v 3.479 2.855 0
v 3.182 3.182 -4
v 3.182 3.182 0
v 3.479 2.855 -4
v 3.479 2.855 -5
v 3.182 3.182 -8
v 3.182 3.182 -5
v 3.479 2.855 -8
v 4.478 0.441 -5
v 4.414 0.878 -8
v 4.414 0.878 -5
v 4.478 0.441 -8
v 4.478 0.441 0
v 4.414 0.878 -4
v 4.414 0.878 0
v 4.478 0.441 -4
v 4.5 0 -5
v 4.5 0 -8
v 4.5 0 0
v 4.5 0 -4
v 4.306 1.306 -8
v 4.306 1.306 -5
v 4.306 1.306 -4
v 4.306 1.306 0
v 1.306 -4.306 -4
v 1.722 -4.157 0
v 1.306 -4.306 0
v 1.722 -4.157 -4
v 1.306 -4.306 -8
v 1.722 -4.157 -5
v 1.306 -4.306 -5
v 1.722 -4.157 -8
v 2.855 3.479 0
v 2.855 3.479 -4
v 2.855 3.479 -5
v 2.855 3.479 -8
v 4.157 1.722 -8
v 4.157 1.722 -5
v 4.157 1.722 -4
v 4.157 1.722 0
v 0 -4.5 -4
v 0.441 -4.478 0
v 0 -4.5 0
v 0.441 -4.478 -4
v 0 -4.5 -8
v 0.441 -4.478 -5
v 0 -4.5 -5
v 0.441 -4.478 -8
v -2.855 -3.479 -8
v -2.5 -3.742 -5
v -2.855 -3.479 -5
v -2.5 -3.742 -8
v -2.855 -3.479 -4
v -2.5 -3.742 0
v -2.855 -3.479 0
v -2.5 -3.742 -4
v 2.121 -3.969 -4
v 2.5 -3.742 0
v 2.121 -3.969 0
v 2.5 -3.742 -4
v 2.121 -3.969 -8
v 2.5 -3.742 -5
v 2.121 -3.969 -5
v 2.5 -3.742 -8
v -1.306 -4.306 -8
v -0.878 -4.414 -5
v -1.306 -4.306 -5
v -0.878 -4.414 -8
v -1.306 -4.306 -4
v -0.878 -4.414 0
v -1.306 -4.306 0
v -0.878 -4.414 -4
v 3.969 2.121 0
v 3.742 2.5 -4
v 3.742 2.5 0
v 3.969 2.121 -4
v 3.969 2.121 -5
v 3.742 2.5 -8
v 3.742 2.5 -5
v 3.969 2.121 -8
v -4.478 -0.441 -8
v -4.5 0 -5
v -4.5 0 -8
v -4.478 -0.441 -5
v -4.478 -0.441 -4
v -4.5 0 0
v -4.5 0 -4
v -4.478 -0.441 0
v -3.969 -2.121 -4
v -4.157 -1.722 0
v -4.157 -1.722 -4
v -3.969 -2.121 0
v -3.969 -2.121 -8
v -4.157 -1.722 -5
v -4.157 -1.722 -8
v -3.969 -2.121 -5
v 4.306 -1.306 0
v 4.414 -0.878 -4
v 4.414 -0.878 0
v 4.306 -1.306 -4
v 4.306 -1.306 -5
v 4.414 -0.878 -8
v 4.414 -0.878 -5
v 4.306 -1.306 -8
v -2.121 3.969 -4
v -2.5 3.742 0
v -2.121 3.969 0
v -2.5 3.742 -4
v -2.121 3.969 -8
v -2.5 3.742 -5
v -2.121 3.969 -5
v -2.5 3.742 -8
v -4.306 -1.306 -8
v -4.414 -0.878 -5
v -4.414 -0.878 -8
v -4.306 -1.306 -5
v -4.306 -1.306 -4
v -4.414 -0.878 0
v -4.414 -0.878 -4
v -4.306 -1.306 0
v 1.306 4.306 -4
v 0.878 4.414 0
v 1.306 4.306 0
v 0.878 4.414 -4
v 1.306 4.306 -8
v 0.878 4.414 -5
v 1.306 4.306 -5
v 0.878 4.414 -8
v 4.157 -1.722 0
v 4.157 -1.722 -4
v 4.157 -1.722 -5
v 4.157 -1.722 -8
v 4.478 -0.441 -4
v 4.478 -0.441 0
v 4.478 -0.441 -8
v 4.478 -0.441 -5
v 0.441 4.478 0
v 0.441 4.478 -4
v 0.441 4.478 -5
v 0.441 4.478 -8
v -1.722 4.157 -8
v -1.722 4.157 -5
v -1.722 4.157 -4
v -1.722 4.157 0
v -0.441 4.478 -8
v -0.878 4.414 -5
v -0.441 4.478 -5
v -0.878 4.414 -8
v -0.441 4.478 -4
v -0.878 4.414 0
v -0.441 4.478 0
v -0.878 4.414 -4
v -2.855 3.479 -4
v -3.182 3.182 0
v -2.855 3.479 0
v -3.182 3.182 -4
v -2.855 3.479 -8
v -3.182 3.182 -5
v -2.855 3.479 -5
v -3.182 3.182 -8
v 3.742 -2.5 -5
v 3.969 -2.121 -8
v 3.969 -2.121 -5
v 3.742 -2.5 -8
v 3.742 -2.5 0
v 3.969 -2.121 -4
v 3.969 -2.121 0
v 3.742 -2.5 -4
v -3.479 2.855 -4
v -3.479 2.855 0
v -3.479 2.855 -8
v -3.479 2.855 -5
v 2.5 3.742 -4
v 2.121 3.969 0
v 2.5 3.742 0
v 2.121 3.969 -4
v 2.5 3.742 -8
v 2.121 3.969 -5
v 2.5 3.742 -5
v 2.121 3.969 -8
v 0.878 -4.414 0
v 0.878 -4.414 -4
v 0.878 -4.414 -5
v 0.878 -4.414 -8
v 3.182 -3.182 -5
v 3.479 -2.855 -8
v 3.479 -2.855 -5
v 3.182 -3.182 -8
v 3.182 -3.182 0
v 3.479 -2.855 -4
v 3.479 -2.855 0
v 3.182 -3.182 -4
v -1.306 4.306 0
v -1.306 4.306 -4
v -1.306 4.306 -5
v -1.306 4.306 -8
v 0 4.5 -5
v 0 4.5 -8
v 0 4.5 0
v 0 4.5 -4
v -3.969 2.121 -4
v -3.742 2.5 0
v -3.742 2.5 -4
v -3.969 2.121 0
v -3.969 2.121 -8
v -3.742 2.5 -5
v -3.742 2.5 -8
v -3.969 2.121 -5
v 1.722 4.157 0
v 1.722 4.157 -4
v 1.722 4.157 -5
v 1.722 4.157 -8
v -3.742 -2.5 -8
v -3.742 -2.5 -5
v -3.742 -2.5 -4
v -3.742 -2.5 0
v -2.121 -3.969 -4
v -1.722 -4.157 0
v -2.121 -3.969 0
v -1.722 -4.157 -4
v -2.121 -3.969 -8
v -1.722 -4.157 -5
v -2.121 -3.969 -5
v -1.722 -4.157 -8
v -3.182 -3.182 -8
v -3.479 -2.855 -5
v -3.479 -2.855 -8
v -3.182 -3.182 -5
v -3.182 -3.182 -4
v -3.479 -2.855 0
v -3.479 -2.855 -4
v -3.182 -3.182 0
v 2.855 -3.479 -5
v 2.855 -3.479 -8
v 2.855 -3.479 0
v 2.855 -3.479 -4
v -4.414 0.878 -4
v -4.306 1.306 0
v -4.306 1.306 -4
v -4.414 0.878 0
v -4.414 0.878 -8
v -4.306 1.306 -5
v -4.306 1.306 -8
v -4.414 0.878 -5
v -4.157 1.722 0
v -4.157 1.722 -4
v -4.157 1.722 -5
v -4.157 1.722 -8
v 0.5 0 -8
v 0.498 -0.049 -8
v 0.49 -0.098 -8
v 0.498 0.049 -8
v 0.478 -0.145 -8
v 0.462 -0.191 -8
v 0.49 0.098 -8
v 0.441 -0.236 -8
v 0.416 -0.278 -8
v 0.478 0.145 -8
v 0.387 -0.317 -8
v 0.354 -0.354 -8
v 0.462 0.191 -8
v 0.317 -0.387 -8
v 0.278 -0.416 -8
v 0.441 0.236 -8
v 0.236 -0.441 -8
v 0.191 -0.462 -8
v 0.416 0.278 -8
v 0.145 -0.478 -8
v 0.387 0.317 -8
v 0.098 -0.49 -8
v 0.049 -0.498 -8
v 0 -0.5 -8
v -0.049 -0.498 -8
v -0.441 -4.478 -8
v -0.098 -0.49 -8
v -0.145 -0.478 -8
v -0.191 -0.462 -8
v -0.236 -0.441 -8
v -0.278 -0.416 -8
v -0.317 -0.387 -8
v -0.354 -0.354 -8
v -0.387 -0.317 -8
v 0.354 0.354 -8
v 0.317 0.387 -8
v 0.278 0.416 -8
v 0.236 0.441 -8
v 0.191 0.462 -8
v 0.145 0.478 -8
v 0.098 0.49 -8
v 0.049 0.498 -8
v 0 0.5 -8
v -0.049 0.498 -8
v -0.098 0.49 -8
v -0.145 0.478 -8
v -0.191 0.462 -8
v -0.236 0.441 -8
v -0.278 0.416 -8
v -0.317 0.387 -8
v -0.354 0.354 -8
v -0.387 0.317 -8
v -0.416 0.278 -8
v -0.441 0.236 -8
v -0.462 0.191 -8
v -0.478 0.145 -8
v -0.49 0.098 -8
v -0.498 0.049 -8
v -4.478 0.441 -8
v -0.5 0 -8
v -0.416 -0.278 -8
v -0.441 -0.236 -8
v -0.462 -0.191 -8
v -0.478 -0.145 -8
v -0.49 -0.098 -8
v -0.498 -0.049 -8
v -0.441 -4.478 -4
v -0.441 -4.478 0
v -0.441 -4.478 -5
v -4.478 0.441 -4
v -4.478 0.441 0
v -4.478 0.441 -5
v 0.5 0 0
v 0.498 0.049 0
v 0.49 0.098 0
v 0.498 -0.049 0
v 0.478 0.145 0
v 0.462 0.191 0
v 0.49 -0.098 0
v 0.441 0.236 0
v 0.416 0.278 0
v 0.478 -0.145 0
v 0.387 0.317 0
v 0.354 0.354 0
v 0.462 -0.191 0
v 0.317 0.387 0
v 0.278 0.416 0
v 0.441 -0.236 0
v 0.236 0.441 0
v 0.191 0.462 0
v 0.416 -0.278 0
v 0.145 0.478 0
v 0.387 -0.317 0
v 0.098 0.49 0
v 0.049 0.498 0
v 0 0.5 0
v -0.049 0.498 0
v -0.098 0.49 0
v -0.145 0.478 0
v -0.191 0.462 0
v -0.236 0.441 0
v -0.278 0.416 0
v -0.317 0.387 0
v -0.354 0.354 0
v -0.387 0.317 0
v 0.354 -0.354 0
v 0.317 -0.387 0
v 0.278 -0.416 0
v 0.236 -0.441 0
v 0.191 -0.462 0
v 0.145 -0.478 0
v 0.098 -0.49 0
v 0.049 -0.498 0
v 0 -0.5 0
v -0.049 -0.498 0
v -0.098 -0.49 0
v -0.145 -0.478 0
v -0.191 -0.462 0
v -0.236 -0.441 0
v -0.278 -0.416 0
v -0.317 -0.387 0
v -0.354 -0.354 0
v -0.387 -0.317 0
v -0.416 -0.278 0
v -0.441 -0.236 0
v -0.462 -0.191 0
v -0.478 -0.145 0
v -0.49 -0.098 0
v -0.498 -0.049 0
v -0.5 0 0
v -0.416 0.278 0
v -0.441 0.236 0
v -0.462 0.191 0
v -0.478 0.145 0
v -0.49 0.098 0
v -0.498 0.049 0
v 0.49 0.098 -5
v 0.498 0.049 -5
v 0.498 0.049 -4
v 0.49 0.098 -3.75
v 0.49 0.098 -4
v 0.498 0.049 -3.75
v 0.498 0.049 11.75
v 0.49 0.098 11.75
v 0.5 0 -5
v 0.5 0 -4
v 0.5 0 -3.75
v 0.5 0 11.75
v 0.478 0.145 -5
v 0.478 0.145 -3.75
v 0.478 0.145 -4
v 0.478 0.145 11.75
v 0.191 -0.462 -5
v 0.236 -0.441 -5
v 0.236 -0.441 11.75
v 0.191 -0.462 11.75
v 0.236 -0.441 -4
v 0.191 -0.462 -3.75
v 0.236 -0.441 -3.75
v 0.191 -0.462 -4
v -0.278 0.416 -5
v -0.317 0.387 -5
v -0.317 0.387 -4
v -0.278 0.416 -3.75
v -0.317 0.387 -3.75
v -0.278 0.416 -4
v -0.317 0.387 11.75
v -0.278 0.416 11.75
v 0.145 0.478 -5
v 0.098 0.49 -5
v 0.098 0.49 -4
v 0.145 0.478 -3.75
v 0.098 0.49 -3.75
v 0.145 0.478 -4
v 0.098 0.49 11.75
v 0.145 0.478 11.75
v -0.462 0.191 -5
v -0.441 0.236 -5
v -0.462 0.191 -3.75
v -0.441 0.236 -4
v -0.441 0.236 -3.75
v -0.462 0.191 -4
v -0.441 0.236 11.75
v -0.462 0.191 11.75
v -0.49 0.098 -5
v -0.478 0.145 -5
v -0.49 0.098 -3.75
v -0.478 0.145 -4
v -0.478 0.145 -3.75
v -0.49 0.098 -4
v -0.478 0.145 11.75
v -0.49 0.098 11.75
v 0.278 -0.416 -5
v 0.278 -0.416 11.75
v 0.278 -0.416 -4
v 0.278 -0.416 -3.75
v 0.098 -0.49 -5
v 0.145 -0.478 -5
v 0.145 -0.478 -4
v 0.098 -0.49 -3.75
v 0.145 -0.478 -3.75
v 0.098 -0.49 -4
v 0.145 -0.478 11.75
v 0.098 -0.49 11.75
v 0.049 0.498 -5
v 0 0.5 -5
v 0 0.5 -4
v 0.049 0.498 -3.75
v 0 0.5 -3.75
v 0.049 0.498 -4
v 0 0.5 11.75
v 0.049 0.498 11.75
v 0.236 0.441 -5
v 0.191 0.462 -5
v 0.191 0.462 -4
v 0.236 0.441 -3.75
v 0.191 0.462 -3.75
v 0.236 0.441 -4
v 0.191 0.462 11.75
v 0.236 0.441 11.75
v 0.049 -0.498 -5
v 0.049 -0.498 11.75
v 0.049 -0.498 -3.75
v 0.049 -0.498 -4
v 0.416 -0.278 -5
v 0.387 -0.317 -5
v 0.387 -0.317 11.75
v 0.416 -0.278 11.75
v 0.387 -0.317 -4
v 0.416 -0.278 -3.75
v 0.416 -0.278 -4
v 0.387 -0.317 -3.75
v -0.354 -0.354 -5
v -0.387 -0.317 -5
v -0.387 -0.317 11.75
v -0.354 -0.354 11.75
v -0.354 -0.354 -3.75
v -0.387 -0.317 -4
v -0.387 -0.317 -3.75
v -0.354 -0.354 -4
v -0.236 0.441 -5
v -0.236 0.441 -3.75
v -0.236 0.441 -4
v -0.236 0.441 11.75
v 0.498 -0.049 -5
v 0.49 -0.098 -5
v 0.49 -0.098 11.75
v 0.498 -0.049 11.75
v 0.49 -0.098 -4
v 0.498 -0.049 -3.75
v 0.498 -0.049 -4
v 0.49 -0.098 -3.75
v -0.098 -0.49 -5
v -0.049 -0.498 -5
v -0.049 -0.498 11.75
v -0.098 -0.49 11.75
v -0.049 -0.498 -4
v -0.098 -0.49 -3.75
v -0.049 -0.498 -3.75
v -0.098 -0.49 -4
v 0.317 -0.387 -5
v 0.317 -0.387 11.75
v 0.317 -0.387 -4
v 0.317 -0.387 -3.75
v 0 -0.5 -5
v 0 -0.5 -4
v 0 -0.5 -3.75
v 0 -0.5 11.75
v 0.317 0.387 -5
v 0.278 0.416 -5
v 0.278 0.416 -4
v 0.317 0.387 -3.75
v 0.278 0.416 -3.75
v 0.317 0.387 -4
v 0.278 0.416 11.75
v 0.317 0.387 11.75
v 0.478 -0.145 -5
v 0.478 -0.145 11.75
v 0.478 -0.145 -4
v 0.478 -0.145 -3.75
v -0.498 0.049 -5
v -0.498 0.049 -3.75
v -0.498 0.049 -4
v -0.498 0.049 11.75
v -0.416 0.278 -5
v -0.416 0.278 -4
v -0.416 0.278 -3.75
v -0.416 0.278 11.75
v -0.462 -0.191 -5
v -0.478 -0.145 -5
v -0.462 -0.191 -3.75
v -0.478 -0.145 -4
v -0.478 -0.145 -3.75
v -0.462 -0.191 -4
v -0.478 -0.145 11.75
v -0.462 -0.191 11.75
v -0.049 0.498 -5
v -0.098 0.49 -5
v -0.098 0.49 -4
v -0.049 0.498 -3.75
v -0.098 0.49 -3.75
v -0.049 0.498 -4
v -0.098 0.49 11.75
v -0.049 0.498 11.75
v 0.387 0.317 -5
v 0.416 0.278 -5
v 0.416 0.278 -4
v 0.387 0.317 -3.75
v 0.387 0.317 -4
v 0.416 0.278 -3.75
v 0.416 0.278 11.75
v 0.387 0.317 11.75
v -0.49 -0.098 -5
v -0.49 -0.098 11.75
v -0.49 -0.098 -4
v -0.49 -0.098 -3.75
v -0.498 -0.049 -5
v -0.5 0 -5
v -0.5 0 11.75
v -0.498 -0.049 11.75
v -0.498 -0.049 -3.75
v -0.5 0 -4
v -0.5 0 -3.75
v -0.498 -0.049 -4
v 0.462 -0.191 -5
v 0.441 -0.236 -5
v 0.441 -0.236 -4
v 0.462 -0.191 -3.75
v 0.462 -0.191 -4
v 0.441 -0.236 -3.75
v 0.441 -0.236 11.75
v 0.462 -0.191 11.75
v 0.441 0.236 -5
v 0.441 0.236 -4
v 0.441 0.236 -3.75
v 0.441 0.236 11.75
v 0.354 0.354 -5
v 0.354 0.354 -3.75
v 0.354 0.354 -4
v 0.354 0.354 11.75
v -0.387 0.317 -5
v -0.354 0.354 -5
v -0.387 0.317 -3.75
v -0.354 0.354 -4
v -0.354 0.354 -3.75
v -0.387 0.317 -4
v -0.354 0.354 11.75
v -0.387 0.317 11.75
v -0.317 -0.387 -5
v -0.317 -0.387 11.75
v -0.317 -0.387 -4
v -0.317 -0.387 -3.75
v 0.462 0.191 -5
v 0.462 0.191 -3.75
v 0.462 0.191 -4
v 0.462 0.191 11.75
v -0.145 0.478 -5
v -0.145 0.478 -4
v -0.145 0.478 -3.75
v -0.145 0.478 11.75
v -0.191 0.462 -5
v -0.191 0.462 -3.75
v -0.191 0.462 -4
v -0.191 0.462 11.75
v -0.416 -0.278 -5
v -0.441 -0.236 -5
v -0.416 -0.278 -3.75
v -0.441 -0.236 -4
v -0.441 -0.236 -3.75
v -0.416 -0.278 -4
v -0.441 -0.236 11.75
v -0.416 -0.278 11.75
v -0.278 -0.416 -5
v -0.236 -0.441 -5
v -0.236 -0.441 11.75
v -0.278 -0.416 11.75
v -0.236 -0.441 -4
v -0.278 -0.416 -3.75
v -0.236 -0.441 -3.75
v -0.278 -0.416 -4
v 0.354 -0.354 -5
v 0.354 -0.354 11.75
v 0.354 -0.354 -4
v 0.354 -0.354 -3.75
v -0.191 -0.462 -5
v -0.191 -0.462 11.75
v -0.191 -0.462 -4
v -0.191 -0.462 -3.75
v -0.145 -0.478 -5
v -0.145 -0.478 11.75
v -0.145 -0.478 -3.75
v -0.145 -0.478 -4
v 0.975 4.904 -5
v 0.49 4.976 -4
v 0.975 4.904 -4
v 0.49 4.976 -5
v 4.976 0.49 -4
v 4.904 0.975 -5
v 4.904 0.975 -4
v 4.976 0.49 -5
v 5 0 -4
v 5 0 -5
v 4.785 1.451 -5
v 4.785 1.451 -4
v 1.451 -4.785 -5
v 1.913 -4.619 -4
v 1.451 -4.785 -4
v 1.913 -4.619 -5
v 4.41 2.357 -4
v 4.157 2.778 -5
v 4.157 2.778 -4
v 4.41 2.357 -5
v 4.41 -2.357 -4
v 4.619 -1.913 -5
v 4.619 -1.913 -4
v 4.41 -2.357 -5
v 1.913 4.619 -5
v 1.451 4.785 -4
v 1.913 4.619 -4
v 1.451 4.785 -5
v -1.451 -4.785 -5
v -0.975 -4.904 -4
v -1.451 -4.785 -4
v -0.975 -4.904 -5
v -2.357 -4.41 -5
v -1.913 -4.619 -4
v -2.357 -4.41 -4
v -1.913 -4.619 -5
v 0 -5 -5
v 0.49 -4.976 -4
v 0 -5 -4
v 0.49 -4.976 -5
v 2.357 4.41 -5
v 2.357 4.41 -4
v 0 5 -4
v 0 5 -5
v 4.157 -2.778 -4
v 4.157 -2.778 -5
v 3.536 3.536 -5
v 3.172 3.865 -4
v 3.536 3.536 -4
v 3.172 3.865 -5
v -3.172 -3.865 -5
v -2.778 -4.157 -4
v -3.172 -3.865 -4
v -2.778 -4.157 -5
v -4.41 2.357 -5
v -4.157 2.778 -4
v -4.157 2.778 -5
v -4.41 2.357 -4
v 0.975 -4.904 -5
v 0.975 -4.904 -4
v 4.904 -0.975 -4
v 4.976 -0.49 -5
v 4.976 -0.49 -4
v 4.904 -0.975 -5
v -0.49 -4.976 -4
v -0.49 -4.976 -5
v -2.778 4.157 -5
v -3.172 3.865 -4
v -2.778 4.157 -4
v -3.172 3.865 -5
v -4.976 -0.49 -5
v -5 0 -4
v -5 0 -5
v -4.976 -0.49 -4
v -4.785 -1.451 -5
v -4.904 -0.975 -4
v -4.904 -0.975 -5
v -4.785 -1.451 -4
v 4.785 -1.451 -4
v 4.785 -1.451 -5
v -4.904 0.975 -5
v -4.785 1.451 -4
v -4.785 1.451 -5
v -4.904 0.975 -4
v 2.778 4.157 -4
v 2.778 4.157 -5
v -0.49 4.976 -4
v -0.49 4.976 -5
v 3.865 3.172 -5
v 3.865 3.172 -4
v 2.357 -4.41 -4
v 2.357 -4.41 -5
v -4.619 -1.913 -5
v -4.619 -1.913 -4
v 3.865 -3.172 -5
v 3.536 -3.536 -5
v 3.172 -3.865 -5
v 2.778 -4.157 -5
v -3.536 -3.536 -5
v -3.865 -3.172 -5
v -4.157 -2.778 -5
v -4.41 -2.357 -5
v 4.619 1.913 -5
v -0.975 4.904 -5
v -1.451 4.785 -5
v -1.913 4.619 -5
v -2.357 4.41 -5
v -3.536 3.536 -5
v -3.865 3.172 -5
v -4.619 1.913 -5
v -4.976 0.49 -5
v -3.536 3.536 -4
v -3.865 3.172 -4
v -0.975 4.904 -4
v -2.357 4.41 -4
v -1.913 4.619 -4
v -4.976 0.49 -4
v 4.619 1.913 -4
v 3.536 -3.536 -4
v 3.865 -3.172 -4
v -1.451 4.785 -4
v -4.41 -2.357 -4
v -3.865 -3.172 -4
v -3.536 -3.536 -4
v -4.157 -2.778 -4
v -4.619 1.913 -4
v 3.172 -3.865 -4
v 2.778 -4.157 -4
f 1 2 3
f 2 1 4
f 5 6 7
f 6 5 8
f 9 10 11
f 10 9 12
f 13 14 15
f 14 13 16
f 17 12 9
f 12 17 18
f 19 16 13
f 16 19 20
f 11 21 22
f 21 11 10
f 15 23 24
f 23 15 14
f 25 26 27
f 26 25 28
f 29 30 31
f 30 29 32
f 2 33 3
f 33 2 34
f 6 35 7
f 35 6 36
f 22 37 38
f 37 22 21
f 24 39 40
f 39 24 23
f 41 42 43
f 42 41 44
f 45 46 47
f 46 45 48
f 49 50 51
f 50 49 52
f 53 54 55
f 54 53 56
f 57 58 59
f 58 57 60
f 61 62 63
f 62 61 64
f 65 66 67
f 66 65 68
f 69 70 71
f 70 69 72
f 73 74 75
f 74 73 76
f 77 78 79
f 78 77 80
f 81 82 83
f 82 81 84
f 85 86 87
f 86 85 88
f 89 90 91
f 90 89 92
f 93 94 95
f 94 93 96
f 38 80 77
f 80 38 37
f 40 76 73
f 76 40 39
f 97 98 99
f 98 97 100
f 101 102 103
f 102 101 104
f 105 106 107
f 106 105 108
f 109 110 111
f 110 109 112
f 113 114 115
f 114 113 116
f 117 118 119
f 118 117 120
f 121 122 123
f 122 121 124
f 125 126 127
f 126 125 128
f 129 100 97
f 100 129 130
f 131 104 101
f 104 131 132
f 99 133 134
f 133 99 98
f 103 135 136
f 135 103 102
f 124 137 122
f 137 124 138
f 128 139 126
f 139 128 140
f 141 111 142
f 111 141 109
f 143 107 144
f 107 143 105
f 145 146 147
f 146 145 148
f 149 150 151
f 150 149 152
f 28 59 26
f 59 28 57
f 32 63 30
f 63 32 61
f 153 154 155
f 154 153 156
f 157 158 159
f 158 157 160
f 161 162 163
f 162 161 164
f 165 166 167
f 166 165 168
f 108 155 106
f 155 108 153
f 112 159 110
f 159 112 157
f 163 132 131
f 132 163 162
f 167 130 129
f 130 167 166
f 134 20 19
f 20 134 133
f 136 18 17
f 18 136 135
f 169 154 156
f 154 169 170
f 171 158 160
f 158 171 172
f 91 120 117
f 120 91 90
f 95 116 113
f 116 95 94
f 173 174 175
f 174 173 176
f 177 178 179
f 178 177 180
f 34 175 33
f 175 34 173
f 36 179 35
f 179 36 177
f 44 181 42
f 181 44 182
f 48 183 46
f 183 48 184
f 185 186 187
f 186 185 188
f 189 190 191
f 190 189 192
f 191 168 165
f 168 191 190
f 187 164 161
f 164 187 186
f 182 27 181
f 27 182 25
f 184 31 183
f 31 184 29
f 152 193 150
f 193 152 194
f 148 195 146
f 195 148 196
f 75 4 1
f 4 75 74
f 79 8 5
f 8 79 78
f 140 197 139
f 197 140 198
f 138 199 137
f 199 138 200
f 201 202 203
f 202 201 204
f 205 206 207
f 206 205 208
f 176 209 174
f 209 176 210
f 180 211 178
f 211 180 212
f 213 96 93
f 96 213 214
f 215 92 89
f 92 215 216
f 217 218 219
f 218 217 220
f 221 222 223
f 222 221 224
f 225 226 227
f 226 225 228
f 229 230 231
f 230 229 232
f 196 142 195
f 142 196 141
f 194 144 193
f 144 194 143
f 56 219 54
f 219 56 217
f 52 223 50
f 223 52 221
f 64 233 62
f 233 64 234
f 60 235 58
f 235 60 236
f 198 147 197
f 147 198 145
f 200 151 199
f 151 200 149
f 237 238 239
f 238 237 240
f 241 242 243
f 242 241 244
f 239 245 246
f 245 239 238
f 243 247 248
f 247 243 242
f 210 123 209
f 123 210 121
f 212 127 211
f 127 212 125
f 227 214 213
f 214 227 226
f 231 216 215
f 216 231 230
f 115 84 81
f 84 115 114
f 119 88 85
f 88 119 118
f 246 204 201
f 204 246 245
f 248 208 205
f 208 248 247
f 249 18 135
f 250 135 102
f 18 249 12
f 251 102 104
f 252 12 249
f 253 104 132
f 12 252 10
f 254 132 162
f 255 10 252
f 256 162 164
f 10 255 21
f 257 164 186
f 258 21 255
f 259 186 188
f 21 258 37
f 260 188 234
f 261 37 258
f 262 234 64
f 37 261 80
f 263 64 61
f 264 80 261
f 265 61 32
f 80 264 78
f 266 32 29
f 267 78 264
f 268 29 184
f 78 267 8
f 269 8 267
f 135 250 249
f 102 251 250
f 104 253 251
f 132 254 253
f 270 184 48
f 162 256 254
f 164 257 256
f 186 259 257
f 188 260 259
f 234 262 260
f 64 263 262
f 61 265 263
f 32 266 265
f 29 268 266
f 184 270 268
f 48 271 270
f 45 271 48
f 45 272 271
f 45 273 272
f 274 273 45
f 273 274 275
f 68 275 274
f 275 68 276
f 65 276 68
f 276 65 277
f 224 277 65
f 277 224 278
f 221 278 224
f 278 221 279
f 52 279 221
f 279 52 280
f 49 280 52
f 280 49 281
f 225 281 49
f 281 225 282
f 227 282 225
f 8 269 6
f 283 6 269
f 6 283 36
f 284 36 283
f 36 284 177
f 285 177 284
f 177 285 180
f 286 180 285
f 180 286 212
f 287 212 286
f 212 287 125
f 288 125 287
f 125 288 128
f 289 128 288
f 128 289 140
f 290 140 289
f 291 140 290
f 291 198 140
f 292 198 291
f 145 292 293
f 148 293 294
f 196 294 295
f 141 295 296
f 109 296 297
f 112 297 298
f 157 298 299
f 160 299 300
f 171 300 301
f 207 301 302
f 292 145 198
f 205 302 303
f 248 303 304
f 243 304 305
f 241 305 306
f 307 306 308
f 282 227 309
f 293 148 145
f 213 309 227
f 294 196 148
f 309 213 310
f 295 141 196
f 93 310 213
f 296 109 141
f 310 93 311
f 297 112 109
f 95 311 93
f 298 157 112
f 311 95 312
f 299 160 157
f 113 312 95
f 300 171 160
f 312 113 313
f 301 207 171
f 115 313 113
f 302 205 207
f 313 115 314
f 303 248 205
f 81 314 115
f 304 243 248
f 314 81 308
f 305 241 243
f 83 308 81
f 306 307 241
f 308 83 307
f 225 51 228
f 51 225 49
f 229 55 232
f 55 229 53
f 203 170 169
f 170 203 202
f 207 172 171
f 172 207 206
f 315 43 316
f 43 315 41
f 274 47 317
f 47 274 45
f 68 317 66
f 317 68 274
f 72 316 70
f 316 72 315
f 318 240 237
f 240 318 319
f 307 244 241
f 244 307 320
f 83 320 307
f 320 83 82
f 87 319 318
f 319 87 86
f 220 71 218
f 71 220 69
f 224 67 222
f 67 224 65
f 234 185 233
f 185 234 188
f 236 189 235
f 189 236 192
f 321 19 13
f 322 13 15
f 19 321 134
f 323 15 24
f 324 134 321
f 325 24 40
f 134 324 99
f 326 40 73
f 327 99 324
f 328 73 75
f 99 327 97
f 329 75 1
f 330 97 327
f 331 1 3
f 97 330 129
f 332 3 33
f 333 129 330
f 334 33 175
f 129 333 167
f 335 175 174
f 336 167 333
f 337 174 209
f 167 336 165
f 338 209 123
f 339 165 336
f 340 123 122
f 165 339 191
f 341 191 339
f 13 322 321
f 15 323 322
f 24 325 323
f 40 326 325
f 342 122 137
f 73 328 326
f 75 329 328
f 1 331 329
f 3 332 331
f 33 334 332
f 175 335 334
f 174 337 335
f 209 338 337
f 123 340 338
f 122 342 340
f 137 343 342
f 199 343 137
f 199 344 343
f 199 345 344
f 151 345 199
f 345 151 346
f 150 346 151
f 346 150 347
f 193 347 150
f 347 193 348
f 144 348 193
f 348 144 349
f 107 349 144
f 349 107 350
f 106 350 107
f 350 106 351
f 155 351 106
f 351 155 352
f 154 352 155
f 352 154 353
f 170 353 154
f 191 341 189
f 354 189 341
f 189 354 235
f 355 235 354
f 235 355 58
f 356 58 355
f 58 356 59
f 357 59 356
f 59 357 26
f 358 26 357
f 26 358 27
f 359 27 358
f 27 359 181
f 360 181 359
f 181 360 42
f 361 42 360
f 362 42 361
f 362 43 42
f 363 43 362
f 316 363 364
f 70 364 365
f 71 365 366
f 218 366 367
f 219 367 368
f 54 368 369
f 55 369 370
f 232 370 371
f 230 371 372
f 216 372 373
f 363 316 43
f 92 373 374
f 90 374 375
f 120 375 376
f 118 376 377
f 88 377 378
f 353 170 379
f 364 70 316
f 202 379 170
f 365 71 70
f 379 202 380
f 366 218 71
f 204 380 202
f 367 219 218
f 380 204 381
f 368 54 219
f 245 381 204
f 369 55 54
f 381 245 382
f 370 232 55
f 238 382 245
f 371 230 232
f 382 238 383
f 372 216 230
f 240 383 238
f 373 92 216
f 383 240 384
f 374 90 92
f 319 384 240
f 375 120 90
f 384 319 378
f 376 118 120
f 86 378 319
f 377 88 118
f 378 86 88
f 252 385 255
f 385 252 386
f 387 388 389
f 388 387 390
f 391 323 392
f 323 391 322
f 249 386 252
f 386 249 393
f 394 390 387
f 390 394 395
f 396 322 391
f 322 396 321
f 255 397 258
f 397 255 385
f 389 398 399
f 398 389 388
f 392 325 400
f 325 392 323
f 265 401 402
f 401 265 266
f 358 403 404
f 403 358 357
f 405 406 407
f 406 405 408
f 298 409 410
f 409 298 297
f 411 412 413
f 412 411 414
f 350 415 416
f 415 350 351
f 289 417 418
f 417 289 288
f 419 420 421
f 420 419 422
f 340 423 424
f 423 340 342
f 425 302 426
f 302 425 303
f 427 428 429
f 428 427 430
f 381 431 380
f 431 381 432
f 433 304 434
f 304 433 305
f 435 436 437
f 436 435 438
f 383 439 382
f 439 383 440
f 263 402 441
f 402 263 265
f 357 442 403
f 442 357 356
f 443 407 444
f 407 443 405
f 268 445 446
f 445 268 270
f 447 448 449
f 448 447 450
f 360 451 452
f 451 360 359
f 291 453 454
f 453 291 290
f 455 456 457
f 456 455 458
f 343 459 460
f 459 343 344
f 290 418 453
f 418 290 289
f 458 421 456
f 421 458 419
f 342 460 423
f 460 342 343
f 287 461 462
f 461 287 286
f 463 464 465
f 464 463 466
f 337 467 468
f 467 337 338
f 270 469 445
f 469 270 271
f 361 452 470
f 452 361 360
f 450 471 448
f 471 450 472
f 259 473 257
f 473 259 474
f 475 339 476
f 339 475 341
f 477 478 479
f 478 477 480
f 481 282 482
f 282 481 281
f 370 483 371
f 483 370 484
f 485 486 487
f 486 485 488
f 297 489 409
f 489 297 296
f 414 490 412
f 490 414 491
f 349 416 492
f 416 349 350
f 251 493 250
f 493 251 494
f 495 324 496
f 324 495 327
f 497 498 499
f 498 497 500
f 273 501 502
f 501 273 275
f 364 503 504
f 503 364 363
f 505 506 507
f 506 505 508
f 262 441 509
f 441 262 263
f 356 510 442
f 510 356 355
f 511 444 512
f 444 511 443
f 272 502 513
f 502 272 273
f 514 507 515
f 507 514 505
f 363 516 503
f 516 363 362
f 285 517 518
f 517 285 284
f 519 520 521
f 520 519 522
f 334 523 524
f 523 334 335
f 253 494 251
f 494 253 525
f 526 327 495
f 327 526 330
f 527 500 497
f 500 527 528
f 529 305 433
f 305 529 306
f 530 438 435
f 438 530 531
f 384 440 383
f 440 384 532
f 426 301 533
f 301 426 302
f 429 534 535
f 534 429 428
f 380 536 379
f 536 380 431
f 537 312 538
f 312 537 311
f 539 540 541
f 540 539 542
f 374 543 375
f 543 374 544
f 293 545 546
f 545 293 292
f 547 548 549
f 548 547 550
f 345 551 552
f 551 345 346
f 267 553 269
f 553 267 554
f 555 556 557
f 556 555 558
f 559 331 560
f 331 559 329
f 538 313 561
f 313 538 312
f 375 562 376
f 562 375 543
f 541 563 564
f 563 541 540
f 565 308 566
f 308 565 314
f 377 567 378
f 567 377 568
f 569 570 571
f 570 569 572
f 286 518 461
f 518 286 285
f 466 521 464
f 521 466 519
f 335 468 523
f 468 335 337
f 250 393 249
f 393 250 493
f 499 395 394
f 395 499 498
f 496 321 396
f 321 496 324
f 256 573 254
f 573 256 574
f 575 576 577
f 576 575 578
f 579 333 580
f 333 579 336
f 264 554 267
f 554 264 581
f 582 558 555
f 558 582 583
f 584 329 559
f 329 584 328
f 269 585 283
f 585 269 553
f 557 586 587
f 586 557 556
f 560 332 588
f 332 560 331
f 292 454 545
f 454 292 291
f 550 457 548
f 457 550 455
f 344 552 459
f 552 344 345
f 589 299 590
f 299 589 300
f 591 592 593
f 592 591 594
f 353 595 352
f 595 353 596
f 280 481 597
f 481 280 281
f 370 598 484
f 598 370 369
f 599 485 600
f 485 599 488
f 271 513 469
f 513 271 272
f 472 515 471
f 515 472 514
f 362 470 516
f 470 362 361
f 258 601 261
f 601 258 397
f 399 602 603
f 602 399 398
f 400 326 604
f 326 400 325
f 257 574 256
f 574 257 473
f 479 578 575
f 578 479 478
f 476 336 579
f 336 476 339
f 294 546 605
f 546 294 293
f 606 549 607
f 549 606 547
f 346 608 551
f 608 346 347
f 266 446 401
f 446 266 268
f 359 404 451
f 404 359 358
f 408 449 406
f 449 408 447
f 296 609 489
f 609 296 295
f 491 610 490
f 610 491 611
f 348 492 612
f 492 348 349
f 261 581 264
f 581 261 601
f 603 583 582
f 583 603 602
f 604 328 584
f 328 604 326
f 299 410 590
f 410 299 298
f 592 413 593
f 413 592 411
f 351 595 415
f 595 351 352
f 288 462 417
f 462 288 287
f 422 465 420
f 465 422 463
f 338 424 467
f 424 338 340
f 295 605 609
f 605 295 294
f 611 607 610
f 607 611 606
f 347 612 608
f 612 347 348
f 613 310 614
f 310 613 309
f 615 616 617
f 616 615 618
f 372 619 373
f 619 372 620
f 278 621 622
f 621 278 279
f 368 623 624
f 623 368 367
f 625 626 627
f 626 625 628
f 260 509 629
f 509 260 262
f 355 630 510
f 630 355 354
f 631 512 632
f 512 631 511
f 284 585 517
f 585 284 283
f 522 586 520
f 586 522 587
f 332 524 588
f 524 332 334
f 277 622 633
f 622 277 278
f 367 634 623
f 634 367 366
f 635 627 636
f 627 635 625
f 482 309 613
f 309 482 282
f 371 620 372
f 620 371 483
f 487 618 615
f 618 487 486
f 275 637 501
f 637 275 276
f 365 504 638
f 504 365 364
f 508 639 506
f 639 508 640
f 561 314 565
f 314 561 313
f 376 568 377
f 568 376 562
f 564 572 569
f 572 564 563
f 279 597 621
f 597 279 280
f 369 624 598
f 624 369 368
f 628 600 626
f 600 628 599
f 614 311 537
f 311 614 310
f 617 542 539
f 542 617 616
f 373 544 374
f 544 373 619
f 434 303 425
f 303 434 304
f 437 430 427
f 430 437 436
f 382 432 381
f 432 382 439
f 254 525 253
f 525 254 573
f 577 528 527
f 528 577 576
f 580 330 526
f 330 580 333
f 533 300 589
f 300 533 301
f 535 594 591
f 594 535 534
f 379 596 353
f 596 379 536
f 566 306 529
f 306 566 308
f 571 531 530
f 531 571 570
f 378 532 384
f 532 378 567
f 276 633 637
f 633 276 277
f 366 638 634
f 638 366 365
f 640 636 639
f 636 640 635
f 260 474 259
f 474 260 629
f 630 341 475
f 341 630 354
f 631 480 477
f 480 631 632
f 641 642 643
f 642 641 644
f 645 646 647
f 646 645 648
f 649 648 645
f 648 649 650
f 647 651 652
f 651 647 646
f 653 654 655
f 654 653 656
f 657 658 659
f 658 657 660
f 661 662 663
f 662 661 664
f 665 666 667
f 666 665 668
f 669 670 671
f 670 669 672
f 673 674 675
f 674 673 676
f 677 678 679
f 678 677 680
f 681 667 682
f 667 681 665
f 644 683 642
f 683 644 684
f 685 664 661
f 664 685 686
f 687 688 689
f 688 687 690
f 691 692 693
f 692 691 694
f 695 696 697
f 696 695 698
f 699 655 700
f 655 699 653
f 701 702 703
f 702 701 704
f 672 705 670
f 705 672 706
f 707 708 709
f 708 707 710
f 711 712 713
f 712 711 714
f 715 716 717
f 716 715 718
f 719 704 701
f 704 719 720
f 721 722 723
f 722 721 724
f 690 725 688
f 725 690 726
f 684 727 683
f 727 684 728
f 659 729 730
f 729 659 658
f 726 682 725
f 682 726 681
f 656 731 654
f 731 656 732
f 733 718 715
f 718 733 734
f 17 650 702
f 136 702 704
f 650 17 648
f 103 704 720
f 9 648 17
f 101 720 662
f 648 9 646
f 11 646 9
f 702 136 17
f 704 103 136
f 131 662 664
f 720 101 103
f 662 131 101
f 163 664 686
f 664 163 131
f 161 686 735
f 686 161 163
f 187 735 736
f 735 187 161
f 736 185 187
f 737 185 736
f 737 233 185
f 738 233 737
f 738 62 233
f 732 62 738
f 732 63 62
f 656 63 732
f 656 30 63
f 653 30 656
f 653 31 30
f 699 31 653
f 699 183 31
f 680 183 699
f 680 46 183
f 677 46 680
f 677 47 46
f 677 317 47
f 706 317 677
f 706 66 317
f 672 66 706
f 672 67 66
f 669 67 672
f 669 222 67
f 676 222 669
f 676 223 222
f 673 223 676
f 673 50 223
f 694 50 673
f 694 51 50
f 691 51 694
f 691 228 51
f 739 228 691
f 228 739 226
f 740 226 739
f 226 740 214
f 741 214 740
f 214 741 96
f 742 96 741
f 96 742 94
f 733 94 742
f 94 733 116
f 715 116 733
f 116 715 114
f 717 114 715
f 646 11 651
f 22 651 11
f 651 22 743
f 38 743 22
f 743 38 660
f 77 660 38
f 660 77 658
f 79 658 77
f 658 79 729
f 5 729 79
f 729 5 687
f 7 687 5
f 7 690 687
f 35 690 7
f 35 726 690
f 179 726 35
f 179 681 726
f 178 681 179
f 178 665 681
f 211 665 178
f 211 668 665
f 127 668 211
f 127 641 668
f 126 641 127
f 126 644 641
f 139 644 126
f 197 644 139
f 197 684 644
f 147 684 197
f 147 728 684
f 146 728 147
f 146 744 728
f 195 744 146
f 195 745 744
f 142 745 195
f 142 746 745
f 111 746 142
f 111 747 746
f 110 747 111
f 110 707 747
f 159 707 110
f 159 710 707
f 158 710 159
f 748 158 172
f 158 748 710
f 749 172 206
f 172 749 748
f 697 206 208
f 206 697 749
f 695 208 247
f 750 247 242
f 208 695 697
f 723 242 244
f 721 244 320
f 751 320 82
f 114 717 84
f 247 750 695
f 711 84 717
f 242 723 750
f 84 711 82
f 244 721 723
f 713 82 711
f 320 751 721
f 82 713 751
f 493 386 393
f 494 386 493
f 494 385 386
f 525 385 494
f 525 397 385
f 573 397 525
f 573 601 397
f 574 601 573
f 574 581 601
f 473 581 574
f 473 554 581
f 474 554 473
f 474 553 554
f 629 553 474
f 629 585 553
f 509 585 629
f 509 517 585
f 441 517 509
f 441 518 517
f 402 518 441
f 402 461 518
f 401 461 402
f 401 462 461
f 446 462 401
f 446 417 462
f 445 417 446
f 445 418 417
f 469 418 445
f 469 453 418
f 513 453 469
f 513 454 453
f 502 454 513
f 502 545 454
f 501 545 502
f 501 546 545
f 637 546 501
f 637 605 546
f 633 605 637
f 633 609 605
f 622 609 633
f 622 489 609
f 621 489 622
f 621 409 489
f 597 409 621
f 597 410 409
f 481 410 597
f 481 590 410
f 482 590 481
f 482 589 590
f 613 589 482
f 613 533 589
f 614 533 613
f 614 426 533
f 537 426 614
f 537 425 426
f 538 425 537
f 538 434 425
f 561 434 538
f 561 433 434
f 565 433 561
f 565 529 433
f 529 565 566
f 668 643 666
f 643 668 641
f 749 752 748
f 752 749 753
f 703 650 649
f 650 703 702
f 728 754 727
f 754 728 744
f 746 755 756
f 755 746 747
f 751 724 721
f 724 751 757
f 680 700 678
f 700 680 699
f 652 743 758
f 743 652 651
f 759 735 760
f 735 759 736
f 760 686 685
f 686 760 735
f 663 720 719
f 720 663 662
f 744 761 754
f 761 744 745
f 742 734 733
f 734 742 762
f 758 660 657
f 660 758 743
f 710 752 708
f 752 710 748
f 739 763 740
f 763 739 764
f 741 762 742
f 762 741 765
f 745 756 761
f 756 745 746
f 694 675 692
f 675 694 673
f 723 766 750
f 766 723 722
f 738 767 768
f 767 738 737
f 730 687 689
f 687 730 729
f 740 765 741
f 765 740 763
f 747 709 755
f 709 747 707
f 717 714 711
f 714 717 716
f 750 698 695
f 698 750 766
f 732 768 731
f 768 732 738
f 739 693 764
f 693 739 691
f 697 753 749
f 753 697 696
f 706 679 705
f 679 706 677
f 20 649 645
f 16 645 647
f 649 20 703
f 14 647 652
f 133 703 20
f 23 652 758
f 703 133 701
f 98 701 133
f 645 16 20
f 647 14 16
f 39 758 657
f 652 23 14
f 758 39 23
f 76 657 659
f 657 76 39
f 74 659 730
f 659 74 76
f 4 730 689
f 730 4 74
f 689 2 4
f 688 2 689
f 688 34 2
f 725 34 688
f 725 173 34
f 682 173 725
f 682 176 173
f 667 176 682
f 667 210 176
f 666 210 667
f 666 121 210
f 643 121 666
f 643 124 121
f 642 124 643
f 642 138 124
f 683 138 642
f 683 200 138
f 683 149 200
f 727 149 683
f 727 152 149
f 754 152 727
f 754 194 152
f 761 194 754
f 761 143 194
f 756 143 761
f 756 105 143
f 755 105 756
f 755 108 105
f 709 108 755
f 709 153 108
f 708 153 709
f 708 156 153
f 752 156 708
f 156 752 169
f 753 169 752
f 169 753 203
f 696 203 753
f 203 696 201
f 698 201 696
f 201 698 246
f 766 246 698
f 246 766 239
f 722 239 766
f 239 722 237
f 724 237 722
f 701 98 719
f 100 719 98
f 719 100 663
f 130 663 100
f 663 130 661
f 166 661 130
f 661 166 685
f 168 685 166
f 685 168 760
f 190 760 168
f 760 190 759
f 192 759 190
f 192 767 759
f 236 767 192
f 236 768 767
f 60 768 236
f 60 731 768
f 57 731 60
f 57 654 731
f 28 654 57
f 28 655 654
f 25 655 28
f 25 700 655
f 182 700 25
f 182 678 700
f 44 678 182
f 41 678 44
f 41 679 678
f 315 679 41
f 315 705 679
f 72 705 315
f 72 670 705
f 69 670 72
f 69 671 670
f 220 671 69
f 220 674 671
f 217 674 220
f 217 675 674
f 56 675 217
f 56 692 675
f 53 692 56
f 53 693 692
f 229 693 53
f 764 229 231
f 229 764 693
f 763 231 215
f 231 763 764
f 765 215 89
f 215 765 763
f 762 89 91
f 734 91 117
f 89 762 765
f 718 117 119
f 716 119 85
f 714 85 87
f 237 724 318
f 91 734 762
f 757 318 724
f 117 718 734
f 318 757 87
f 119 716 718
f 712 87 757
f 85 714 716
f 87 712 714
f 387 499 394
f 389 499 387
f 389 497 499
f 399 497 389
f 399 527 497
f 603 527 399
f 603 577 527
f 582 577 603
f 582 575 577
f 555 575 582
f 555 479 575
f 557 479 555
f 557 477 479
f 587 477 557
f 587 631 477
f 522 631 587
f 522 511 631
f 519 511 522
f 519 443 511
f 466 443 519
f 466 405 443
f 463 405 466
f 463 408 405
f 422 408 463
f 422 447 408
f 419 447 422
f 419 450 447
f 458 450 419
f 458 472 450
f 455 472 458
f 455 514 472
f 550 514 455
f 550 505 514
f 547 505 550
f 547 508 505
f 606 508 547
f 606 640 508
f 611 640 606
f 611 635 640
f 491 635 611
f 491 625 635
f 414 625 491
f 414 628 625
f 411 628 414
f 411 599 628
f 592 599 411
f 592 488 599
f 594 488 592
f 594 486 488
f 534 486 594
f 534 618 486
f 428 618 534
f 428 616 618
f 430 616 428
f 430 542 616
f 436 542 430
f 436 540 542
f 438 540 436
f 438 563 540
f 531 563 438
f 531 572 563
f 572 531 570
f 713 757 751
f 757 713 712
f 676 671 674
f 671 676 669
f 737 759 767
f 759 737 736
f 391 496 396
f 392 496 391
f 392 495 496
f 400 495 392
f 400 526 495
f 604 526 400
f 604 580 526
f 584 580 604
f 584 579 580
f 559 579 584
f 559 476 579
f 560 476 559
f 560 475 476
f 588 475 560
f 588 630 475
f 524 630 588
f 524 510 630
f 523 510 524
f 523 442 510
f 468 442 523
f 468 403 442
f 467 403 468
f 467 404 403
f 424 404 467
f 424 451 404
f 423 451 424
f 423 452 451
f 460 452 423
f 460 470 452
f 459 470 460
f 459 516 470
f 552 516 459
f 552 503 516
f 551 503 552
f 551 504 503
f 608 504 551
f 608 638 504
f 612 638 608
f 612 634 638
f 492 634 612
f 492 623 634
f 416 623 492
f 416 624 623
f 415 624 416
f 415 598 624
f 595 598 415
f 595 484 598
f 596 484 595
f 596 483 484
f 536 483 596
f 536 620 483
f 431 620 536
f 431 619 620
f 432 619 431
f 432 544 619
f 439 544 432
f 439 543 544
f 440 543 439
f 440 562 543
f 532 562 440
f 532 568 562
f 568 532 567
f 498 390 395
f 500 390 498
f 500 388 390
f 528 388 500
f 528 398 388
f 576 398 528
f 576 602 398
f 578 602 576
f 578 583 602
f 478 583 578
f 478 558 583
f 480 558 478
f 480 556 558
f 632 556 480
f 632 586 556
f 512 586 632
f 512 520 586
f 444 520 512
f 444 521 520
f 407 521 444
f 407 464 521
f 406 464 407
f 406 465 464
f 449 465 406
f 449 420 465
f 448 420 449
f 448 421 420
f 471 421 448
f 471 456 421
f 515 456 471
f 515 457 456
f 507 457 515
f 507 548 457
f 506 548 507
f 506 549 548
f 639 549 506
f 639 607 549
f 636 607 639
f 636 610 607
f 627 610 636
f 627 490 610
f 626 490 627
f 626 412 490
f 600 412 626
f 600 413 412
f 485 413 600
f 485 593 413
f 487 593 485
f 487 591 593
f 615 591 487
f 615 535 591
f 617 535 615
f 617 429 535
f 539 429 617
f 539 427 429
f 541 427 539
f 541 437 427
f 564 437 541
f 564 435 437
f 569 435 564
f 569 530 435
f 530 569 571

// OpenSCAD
$fn = 64;

module motor_body() {
    difference() {
        cylinder(h = 8, d = 9, center = true);
        translate([0, 0, -4])
            cylinder(h = 15.5, d = 1, center = true);
    }
}

module base_plate() {
    cylinder(h = 1, d = 10, center = true);
}

module shaft() {
    translate([0, 0, 4])
        cylinder(h = 15.5, d = 1, center = true);
}

translate([0, 0, -4])
    motor_body();

translate([0, 0, -4.5])
    base_plate();

shaft();
